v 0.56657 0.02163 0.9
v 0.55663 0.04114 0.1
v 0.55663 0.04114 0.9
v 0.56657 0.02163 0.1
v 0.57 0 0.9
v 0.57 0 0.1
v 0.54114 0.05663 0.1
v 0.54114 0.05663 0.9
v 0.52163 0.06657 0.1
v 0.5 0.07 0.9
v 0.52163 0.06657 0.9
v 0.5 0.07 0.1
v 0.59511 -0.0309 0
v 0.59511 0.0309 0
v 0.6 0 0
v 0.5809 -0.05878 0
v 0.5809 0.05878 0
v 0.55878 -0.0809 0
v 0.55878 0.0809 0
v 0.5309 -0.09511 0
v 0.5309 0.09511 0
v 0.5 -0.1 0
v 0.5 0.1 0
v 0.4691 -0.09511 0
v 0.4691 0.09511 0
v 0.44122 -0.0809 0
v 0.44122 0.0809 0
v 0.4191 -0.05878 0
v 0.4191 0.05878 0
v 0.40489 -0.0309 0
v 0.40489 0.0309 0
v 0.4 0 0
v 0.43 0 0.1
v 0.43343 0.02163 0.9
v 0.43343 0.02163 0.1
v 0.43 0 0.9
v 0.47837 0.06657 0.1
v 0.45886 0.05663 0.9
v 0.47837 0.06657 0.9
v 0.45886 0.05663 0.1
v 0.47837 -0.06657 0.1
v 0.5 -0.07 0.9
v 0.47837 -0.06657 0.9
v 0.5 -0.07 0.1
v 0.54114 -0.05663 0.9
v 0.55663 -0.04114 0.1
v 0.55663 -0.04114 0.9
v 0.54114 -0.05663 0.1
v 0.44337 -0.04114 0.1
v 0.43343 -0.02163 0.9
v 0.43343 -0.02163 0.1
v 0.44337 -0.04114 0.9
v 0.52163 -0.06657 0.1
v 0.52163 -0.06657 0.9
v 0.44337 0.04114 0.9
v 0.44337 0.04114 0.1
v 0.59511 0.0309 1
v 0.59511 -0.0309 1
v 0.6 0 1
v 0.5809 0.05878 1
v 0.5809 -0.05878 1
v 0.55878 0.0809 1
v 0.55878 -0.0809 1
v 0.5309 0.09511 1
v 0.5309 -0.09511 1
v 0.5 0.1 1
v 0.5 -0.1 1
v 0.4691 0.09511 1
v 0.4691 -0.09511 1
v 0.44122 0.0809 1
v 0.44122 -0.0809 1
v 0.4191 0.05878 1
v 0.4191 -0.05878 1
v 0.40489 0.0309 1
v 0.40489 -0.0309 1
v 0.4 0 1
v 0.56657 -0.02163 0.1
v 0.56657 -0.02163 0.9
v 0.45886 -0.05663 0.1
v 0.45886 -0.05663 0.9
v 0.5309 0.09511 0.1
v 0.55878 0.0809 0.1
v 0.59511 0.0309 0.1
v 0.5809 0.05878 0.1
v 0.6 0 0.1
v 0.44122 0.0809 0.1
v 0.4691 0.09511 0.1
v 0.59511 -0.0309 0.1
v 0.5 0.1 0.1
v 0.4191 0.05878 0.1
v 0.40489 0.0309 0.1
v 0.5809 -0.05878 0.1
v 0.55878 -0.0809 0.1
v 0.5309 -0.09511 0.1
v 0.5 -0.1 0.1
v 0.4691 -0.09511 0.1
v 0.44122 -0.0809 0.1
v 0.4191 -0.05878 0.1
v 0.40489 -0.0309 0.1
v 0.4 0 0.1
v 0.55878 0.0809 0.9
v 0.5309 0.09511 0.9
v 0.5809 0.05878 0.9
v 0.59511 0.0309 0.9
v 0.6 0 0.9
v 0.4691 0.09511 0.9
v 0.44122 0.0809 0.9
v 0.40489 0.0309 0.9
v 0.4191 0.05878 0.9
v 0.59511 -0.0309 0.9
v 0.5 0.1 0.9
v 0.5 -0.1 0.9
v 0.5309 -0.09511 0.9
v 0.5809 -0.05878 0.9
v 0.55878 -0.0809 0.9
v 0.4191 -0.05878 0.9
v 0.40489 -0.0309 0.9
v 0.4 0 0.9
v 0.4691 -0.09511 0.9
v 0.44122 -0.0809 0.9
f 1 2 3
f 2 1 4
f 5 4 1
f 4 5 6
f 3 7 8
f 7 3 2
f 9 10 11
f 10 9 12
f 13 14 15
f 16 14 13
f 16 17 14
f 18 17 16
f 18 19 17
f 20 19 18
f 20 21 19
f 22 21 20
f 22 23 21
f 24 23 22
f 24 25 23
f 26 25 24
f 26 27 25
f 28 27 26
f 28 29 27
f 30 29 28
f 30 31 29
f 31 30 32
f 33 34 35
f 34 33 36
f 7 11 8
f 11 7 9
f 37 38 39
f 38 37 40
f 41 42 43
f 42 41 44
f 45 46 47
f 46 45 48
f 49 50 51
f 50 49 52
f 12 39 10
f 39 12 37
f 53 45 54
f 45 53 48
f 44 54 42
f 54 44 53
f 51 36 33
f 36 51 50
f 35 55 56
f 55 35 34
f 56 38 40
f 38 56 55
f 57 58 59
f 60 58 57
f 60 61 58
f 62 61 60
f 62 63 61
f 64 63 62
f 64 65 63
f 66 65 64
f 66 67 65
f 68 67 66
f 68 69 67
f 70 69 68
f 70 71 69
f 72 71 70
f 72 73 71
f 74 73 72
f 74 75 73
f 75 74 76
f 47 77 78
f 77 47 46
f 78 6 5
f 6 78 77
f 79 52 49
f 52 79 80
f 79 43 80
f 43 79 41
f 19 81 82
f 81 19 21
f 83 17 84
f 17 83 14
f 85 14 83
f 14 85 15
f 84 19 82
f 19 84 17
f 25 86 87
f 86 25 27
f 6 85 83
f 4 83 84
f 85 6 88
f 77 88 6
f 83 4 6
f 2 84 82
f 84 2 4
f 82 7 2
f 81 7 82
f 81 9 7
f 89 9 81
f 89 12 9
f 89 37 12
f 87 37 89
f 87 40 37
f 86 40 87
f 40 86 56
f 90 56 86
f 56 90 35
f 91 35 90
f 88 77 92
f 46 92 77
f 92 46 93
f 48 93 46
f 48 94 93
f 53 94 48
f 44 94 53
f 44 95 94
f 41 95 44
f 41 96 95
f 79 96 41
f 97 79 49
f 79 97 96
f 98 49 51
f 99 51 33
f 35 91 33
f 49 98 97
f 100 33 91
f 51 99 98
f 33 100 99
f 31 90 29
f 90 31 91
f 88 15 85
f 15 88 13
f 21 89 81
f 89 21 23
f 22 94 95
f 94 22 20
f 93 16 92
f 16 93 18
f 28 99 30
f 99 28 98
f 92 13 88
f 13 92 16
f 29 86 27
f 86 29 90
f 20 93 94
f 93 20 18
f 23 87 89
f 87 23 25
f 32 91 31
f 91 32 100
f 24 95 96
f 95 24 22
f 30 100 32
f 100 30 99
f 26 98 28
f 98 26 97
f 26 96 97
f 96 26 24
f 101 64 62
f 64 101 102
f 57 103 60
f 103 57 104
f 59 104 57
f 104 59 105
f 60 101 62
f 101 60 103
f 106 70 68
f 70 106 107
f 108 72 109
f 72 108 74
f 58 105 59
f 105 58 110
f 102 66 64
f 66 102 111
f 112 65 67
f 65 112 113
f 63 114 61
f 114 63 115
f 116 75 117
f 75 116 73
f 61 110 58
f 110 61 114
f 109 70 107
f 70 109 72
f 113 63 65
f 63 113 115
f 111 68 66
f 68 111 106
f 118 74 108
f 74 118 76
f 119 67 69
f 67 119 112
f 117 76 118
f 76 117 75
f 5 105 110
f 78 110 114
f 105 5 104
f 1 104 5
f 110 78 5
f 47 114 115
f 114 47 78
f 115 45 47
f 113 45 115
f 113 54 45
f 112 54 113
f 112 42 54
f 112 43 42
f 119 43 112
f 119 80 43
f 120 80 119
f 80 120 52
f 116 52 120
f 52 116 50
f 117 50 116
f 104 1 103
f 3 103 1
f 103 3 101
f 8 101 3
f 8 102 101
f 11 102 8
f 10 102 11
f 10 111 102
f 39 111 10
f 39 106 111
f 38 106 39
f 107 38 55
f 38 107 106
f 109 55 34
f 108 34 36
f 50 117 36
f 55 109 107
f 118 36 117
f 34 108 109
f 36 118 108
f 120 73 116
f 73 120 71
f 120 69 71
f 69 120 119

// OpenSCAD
color([0.3, 0.3, 0.5])
translate([0.5, 0, 0.0]) {
    cylinder(h = 1.0, r = 0.07, $fn = 20);
    cylinder(h = 0.1, r = 0.1, $fn = 20);
    translate([0,0,0.9])
    cylinder(h = 0.1, r = 0.1, $fn = 20);
}
